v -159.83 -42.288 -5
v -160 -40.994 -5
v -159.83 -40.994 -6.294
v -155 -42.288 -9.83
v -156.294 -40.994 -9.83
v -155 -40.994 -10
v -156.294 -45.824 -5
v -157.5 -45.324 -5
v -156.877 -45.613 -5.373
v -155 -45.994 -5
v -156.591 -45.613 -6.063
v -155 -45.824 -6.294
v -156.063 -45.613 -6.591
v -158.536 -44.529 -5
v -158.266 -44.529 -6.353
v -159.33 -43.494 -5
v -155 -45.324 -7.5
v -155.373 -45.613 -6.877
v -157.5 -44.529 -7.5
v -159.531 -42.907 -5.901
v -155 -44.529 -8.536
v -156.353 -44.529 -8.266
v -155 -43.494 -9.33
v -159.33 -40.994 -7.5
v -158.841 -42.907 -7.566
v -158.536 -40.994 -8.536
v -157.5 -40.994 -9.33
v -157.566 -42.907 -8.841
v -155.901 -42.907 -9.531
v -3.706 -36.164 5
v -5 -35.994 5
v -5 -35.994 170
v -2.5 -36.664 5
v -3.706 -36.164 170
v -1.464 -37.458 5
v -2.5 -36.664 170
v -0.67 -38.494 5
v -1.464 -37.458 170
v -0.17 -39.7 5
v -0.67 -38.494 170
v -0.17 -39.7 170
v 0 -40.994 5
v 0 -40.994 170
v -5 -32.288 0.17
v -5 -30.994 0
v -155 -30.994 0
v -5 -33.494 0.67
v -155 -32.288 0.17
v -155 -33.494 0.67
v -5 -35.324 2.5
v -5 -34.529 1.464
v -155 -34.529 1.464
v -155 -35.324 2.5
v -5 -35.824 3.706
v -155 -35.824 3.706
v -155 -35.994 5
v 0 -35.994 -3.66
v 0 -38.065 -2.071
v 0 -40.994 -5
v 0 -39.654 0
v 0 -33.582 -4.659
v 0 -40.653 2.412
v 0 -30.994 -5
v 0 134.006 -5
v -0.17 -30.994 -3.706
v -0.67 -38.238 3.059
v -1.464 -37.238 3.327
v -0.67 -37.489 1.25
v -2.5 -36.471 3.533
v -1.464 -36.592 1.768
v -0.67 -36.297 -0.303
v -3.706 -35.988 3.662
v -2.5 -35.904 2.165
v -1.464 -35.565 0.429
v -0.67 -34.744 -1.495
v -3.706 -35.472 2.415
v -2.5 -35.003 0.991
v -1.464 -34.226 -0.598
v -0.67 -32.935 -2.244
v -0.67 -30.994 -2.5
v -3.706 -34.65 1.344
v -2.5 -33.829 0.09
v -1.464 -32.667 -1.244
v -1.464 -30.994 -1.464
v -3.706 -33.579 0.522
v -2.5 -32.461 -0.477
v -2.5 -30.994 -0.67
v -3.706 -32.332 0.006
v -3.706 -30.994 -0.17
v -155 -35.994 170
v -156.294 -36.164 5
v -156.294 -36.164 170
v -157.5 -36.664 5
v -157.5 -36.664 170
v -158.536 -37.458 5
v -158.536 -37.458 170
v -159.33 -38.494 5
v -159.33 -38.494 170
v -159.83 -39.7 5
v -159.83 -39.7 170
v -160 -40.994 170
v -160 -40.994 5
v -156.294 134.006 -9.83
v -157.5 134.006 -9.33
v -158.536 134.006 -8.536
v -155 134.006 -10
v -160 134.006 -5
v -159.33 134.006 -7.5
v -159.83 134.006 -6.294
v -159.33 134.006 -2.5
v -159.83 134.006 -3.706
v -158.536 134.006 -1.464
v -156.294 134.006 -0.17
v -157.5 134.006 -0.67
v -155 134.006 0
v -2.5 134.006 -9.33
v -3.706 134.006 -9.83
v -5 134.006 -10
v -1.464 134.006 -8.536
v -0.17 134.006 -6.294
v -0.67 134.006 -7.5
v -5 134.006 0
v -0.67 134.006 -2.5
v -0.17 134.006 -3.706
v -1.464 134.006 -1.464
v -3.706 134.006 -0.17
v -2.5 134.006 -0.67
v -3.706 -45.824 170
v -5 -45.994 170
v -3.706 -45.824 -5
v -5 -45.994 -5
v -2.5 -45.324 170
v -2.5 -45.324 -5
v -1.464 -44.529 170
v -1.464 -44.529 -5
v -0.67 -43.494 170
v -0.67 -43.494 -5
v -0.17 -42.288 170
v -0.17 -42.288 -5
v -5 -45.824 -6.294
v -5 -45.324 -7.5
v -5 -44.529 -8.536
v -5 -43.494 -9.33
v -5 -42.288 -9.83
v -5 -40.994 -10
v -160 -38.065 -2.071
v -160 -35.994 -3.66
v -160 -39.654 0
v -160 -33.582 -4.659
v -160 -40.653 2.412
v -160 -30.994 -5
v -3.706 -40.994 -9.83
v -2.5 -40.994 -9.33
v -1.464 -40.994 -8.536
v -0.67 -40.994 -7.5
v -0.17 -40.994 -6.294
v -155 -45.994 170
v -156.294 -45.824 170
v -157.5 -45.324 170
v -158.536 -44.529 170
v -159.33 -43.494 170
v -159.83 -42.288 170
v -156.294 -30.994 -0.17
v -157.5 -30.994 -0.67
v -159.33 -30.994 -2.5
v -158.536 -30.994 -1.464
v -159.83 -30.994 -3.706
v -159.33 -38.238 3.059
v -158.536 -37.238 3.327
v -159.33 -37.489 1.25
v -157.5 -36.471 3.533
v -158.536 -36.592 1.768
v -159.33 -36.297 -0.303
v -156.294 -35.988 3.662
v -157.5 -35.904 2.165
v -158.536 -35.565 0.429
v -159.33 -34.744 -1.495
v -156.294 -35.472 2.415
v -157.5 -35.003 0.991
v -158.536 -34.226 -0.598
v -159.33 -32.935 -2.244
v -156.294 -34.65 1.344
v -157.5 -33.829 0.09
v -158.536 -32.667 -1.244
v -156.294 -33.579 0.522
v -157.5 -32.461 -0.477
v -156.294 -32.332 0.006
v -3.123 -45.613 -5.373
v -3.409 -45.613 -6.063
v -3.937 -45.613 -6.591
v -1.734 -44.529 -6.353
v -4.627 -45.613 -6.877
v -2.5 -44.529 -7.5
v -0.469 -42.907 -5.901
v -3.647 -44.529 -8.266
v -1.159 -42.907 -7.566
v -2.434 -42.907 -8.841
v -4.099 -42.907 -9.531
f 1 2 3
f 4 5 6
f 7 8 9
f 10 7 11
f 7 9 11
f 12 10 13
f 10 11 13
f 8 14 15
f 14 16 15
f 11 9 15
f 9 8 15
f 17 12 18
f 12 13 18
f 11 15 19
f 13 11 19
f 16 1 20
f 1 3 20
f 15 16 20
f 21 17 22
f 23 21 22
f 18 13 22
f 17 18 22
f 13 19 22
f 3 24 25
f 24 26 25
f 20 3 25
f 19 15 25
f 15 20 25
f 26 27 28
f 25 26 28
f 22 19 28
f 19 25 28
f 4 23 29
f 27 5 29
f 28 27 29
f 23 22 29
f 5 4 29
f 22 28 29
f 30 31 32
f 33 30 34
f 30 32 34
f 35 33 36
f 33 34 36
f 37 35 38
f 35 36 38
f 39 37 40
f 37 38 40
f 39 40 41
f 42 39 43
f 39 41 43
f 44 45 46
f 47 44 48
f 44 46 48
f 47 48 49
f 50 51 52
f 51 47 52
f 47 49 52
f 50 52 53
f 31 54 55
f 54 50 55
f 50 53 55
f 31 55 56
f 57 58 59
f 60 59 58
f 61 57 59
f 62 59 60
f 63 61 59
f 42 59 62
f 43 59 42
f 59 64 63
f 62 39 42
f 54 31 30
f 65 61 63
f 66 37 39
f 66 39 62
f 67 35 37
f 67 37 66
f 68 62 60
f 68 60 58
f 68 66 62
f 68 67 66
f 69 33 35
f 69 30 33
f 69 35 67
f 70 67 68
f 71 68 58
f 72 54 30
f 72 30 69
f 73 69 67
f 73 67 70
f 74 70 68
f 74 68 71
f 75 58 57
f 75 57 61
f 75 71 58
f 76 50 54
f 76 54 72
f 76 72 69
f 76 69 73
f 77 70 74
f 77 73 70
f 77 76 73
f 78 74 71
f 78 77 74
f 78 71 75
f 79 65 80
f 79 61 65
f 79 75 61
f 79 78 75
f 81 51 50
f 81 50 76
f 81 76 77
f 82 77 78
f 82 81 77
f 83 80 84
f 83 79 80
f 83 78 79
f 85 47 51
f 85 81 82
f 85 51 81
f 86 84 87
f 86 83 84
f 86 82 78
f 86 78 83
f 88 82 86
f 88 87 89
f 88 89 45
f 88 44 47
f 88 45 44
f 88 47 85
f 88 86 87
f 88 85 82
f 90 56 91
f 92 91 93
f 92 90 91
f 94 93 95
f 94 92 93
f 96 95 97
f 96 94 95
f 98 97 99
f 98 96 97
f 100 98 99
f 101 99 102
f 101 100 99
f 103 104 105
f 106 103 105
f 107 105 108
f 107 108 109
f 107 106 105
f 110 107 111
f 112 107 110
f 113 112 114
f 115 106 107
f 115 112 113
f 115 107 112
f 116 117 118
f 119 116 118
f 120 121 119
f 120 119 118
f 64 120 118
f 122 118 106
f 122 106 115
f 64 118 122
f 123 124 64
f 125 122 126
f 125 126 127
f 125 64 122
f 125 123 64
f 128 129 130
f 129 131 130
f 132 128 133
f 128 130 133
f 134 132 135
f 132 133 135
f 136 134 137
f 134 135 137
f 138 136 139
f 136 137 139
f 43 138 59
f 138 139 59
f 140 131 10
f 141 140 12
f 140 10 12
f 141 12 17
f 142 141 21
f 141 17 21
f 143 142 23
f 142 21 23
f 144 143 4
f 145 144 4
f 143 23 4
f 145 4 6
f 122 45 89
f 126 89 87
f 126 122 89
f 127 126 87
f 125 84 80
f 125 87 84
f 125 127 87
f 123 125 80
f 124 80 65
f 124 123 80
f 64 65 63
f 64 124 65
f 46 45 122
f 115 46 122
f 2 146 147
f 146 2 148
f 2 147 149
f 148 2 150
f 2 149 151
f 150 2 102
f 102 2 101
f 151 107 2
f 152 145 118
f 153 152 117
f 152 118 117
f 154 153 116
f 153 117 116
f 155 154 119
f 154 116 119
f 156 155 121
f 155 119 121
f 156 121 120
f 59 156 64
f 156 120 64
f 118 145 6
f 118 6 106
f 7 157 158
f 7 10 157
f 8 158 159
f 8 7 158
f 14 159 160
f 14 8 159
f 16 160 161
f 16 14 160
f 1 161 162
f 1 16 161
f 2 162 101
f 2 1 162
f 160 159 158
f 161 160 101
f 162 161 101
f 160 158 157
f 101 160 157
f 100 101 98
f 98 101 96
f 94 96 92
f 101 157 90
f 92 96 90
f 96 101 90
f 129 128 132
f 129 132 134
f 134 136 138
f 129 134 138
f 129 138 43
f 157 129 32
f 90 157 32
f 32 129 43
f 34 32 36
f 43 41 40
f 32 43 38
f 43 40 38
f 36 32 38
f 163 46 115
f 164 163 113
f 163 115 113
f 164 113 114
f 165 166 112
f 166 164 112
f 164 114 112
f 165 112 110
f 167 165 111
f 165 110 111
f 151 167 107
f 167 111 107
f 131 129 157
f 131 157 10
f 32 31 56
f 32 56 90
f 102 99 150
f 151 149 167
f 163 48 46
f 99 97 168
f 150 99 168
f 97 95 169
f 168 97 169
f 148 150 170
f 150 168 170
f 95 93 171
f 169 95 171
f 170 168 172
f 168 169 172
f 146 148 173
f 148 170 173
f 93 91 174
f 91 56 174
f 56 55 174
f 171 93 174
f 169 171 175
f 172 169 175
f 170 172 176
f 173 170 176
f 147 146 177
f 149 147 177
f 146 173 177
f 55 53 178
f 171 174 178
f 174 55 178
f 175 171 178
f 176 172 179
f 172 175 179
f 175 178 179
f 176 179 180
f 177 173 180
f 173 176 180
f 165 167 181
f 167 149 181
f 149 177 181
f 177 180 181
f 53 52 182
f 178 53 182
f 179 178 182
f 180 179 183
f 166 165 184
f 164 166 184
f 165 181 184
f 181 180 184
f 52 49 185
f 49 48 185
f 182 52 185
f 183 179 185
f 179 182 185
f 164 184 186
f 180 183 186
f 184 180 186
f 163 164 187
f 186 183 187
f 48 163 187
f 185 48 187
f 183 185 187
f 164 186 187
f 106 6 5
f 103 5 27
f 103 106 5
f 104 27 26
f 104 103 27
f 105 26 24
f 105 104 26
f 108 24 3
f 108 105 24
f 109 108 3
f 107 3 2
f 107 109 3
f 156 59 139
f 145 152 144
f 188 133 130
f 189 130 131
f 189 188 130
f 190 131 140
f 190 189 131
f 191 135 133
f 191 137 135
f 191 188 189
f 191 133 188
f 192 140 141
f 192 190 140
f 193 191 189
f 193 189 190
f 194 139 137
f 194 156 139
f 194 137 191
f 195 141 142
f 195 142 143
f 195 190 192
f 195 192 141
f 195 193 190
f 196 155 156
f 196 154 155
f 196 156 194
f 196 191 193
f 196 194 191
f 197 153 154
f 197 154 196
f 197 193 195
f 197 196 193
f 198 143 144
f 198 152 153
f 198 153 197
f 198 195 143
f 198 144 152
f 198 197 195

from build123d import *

# Parameters (mm, degrees)
F0_W     = 10
F0_H     = 170
F0_H_2   = 10
F0_W_2   = 170
F1_DEPTH = 160
F2_R     = 4.99999


# Not quite as in the source:
# - a fillet or chamfer is up to 0.001 mm smaller than in the source, because OpenCascade refuses the exact size


with BuildPart() as f1:
    # F0 (on Right) → F1 (new body)
    with BuildSketch(Plane.YZ):
        with Locations((-40.9939204156, 85)):
            Rectangle(F0_W, F0_H)
        with Locations((-40.9939204156, -5)):
            Rectangle(F0_W, F0_H_2)
        with Locations((49.0060795844, -5)):
            Rectangle(F0_W_2, F0_H_2)
    extrude(amount=-F1_DEPTH)

    # F2 (radius 5 in the source; OpenCascade refuses exactly that, so slightly less here)
    f2_edges = [f1.edges().sort_by_distance(p)[0] for p in [
        (0, 49.00608, 0),
        (0, 44.00608, -10),
        (-160, 49.00608, 0),
        (-160, 44.00608, -10),
        (-80, -35.99392, 0),
        (-160, -35.99392, 85),
        (-160, -45.99392, 80),
        (0, -35.99392, 85),
        (0, -45.99392, 80),
        (-80, -45.99392, -10),
    ]]
    fillet(f2_edges, radius=F2_R)


solid = f1.part
